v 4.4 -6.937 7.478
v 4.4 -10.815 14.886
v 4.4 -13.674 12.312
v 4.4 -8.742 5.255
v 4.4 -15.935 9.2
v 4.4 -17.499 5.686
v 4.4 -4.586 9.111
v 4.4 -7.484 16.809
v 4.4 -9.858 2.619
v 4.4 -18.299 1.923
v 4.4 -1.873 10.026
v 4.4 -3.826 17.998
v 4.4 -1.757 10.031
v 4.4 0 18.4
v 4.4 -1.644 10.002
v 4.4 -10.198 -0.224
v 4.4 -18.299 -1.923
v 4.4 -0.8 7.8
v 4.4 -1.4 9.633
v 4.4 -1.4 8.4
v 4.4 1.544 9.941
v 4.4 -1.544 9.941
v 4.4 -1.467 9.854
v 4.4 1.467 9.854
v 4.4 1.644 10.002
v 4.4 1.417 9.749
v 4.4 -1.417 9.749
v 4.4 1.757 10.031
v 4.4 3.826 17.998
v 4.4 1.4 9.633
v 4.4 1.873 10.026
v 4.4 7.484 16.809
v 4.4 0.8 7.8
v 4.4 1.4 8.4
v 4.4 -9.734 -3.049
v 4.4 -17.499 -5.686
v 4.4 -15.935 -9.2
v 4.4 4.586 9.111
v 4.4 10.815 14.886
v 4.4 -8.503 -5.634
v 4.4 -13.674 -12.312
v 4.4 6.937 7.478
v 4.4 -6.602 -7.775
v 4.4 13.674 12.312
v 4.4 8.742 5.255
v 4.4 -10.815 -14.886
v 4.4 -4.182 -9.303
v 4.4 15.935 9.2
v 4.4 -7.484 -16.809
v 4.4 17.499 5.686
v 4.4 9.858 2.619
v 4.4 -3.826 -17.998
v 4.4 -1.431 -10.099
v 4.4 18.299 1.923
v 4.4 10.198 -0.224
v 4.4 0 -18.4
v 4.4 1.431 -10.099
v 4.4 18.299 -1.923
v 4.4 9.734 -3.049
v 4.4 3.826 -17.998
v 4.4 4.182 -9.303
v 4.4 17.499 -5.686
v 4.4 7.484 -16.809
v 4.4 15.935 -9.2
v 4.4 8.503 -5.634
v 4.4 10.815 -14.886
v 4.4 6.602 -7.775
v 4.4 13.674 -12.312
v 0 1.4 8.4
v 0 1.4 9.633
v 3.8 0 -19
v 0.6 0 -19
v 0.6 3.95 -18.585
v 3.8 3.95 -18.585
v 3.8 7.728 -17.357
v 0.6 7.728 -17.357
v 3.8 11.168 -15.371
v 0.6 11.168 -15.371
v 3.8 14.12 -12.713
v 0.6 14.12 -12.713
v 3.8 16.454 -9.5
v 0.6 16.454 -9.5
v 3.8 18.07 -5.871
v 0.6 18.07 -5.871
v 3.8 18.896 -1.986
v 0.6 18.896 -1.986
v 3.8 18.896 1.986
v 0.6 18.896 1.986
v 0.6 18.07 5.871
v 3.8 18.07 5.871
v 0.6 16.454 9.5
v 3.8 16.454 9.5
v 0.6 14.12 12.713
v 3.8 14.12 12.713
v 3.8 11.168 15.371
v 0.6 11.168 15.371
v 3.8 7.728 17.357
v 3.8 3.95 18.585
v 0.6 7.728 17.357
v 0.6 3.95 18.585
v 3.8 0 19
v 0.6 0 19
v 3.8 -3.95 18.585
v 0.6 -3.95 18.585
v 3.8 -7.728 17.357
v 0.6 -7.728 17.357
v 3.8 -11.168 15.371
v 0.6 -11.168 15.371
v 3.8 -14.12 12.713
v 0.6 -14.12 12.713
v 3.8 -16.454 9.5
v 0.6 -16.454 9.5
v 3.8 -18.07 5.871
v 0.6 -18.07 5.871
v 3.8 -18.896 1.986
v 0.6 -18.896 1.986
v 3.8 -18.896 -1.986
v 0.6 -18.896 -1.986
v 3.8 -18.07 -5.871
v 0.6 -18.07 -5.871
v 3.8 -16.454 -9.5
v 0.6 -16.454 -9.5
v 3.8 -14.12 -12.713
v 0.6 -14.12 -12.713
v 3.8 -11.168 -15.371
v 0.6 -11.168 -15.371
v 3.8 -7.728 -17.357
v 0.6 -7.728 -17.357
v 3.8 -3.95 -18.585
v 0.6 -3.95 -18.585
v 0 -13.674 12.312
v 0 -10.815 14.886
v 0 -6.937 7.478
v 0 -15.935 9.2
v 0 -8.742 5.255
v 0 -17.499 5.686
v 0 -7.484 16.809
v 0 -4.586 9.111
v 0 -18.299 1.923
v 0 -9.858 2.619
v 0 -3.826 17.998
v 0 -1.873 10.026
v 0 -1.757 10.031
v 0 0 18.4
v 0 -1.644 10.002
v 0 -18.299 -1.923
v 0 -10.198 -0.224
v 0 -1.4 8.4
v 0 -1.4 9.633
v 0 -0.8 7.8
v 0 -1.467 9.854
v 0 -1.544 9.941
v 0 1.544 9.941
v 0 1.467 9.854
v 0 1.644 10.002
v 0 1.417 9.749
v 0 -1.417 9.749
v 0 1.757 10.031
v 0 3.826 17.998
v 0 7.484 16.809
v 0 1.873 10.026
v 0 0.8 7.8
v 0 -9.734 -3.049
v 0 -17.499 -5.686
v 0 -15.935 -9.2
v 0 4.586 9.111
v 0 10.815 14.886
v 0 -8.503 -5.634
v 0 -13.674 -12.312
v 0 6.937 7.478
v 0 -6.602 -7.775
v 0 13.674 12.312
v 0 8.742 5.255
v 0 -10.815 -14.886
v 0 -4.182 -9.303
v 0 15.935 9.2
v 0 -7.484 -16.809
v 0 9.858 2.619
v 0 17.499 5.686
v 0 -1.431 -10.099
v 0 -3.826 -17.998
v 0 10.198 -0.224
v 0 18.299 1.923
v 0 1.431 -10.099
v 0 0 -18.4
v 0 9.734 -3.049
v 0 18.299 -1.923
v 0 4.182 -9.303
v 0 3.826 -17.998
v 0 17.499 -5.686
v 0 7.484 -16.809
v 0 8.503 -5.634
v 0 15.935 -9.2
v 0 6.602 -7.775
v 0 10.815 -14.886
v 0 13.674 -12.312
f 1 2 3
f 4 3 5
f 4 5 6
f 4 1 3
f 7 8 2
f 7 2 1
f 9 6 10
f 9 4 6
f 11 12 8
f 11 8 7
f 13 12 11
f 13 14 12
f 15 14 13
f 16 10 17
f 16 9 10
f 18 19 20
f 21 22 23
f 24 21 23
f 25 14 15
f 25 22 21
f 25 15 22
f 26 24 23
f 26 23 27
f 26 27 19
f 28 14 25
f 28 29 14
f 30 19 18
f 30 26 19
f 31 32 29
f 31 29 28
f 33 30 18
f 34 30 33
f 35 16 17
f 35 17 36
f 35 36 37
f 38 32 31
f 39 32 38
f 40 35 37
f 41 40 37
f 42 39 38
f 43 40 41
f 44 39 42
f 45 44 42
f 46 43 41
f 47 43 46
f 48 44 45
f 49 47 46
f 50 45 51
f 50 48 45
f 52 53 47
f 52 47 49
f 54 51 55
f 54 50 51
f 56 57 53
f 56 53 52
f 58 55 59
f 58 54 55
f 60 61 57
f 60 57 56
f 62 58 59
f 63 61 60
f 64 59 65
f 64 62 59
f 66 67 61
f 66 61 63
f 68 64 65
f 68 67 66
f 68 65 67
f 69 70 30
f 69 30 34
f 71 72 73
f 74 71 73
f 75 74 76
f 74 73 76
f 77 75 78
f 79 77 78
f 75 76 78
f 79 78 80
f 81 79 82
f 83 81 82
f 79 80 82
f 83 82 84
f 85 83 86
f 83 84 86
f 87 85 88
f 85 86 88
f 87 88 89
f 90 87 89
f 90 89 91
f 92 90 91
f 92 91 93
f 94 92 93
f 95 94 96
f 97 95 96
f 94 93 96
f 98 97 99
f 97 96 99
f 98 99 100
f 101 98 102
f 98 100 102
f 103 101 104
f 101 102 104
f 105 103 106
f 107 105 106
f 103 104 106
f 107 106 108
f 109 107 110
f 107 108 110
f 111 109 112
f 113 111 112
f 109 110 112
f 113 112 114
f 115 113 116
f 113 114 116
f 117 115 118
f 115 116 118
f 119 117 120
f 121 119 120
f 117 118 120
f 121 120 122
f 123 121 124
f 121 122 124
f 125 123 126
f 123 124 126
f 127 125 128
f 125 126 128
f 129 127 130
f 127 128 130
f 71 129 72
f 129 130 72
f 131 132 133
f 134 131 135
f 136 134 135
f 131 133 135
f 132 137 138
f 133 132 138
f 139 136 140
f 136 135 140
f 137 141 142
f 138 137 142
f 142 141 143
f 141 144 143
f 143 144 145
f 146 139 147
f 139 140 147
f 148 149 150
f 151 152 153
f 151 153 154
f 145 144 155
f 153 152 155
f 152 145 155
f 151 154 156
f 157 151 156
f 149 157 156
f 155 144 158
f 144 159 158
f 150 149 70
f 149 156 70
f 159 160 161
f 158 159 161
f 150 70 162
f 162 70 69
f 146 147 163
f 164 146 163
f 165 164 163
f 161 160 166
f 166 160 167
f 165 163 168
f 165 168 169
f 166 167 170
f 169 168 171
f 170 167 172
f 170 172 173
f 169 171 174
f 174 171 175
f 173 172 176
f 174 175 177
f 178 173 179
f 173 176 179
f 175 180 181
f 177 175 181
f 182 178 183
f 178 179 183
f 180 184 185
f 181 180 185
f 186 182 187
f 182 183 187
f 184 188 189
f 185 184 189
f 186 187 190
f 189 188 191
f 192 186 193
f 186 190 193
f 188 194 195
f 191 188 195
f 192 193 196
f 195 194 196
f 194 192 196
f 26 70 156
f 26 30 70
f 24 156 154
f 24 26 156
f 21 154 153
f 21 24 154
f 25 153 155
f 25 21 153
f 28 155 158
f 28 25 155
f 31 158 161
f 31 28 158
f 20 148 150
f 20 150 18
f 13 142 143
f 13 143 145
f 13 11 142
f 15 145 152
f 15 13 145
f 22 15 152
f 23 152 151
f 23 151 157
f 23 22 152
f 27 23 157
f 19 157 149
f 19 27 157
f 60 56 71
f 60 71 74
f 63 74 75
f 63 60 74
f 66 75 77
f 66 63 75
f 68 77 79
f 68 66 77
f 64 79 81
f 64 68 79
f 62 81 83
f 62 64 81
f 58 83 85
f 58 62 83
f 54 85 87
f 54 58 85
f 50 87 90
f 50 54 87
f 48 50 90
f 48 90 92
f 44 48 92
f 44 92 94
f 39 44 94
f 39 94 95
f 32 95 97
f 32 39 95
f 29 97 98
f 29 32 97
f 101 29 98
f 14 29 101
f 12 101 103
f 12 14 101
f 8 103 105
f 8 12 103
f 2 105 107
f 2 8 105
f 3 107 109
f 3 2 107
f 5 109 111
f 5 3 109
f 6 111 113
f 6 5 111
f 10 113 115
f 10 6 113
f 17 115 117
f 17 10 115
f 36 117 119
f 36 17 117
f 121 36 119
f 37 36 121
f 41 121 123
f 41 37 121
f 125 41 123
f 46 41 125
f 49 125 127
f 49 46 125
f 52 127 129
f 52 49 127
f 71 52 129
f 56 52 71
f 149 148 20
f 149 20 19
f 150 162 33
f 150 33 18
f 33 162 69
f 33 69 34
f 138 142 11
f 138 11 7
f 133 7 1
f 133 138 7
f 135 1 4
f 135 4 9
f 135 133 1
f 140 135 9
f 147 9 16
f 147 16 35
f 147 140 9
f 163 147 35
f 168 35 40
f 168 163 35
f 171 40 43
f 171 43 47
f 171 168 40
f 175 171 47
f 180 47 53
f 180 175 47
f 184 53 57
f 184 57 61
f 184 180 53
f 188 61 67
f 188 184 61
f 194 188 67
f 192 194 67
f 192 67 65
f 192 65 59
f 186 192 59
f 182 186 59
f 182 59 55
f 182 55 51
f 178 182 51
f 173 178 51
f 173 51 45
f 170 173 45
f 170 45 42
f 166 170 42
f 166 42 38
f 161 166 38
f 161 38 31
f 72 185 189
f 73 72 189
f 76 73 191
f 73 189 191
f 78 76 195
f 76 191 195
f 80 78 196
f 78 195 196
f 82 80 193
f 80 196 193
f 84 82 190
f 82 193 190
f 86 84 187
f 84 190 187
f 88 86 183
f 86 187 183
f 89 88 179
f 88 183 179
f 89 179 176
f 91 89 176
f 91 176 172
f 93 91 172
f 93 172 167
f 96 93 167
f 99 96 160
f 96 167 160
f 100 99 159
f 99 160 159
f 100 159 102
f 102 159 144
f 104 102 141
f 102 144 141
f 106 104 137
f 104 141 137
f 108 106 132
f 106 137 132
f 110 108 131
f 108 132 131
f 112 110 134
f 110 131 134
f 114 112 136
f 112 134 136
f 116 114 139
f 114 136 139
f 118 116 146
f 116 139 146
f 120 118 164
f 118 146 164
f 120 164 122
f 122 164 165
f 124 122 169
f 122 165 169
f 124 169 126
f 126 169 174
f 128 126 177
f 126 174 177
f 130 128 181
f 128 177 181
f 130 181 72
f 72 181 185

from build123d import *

# Parameters (mm, degrees)
CROQUIS1_R              = 19
SALIENTE_EXTRUIR1_DEPTH = 4.4
CHAFL_N1_SIZE           = 0.6
CHAFL_N2_SIZE           = 0.6
REDONDEO1_R             = 0.4


with BuildPart() as part:
    # Croquis1 → Saliente-Extruir1 (new body)
    with BuildSketch(Plane.YZ):
        with Locations(Location((0, 0, 0), (0, 0, 270))):
            Circle(CROQUIS1_R)
        with BuildLine():
            Line((1.4, 10.103464752), (1.4, 7.8))
            Line((1.4, 7.8), (-1.4, 7.8))
            Line((-1.4, 7.8), (-1.4, 10.103464752))
            ThreePointArc((-1.4, 10.103464752), (0, -10.2), (1.4, 10.103464752))
        make_face(mode=Mode.SUBTRACT)
    extrude(amount=SALIENTE_EXTRUIR1_DEPTH)

    # Chaflán1
    chafl_n1_edges = [part.edges().sort_by_distance(p)[0] for p in [
        (0, 0, 19),
        (4.4, 0, 19),
    ]]
    chamfer(chafl_n1_edges, length=CHAFL_N1_SIZE)

    # Chaflán2
    chafl_n2_edges = [part.edges().sort_by_distance(p)[0] for p in [
        (2.2, 1.4, 7.8),
        (2.2, -1.4, 7.8),
    ]]
    chamfer(chafl_n2_edges, length=CHAFL_N2_SIZE)

    # Redondeo1
    redondeo1_edges = [part.edges().sort_by_distance(p)[0] for p in [
        (2.2, -1.4, 10.103464752),
        (2.2, 1.4, 10.103464752),
    ]]
    fillet(redondeo1_edges, radius=REDONDEO1_R)


solid = part.part
